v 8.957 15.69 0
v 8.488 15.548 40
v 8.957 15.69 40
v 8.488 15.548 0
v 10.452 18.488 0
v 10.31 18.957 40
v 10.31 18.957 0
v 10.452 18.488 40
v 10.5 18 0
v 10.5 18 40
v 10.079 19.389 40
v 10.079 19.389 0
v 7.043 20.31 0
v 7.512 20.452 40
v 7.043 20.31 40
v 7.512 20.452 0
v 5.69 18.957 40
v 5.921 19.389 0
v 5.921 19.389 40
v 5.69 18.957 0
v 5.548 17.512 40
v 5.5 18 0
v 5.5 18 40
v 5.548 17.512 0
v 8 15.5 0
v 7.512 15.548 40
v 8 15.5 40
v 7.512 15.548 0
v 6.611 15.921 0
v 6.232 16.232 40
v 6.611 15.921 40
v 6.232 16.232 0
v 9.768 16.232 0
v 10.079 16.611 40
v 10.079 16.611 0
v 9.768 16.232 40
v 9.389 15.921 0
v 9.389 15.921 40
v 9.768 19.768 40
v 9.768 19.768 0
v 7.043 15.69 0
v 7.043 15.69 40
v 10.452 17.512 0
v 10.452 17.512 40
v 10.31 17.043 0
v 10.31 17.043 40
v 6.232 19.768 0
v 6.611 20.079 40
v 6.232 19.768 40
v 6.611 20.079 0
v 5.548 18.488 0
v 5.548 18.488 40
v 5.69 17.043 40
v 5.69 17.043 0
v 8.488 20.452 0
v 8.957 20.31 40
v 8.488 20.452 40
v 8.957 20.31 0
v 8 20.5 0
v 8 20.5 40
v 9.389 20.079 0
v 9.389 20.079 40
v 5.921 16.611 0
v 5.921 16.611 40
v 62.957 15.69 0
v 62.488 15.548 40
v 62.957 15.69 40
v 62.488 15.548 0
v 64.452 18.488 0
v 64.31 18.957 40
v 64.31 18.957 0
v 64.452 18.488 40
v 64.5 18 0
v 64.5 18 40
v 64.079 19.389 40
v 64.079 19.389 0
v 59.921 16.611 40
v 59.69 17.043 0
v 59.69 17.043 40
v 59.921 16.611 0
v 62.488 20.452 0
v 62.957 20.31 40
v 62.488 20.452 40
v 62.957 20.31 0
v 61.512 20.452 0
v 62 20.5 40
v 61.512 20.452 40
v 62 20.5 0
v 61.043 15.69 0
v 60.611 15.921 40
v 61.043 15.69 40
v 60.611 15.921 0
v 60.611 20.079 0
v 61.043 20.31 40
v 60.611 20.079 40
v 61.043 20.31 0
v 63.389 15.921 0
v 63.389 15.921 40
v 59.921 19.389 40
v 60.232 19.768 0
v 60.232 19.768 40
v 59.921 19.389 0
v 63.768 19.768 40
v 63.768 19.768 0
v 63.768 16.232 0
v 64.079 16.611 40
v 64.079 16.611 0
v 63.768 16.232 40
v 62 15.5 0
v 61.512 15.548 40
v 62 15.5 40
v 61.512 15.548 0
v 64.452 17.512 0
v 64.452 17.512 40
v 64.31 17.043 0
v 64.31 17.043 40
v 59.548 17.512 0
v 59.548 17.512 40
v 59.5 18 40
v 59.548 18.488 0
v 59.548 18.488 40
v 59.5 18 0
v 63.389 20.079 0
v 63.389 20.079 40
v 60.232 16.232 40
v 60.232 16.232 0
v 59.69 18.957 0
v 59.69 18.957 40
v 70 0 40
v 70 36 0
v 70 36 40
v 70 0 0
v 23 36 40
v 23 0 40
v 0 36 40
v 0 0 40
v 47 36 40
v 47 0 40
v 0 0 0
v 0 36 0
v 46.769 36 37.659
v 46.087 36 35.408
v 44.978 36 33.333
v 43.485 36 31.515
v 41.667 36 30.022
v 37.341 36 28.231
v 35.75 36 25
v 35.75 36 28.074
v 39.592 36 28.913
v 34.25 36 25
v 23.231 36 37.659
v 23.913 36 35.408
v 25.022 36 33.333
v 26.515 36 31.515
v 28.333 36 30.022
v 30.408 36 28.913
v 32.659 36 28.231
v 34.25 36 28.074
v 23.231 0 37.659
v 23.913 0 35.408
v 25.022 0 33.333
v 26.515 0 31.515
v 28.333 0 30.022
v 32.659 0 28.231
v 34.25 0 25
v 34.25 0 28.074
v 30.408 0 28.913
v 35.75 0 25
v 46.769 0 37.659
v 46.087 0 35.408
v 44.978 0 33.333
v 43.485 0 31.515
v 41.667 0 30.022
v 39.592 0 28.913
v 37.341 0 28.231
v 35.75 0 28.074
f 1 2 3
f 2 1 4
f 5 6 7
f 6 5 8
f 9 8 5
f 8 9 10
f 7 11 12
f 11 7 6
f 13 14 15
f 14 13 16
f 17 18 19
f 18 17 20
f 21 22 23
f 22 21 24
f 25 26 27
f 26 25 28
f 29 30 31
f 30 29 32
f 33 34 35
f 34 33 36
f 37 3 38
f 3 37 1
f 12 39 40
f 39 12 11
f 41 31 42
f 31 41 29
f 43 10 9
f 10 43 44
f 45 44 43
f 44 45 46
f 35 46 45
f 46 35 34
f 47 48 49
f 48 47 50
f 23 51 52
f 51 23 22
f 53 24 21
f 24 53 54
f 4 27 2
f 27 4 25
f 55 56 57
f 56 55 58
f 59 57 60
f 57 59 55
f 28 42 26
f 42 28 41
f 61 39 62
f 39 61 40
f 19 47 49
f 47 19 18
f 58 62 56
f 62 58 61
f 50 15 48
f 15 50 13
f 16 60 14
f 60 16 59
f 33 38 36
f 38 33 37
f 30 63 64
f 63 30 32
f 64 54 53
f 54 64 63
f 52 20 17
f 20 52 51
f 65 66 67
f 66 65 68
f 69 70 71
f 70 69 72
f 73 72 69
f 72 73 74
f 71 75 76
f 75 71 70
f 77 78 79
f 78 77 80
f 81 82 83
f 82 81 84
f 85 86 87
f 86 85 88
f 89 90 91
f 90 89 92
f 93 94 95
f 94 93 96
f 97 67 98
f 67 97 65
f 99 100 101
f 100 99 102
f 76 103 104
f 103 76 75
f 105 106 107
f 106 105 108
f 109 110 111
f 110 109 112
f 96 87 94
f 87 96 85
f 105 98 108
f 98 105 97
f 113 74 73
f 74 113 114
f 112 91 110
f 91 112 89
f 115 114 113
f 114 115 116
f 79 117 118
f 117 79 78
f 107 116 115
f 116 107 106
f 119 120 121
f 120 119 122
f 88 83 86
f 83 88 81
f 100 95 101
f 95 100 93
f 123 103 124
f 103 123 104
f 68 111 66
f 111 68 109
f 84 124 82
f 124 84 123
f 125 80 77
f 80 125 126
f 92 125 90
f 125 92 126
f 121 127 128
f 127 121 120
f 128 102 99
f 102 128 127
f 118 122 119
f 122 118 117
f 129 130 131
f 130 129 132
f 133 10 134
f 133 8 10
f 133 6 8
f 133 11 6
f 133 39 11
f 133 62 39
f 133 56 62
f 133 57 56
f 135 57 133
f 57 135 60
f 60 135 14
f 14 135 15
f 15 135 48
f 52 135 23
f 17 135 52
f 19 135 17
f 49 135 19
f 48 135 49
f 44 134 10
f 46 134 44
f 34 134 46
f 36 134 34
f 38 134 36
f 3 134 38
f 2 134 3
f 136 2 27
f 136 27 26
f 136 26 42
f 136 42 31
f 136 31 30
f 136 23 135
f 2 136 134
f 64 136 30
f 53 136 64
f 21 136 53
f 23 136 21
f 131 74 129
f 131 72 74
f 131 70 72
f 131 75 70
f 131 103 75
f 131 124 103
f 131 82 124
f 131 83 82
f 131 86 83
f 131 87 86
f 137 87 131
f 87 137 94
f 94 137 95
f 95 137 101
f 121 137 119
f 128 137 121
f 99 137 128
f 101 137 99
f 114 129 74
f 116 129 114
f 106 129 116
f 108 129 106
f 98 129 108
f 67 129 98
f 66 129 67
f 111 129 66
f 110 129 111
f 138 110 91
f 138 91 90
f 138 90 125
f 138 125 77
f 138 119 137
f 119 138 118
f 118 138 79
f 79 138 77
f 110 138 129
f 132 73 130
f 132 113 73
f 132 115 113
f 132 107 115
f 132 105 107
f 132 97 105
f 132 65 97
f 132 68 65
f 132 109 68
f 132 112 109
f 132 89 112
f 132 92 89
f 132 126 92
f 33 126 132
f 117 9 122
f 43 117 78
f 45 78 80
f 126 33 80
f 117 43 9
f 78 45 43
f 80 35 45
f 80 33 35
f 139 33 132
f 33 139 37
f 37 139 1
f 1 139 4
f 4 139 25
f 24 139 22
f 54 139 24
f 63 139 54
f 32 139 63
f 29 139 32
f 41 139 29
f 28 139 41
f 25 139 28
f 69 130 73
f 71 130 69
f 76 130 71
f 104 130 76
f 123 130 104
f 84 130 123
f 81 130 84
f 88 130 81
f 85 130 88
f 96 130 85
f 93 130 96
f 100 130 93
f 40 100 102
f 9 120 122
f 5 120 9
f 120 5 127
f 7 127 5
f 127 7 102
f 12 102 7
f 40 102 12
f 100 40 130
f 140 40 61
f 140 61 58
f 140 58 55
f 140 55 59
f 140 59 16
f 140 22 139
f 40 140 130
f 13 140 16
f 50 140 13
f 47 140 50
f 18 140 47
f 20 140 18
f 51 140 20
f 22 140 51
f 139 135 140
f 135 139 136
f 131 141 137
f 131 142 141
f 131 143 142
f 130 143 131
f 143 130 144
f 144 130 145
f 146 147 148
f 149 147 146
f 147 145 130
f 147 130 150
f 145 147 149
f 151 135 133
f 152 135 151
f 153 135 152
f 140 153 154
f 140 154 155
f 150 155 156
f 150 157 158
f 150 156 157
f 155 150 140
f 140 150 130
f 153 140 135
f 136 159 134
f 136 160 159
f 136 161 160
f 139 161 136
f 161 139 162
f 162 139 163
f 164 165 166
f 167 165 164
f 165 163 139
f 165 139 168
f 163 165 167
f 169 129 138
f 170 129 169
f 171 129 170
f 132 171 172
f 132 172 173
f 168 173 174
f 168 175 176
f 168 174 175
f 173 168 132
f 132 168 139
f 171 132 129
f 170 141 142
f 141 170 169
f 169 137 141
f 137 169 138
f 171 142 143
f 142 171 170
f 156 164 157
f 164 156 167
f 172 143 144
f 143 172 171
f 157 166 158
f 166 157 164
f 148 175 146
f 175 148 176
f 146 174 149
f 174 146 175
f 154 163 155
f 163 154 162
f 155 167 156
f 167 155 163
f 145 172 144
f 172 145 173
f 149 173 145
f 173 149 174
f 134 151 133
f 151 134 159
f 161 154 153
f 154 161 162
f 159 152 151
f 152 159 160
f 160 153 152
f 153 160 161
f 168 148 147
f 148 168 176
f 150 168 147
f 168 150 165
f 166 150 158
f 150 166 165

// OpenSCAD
$fn = 32;

// ----------------------------------------------------------------------
// Saddle clamp: split shaft clamp
// ----------------------------------------------------------------------

// --- parameters (mm) ---
blk_l = 70;               // block length, X
blk_w = 36;               // block width, Y
blk_h = 40;               // block height
clamp_r = 12;             // shaft groove radius
hole_r = 2.5;             // bolt hole radius
hole_m = 8;               // bolt hole margin from the ends
saw_w = 1.5;              // saw kerf width

saw_depth = clamp_r + 3;  // saw kerf depth

difference() {
  cube([blk_l, blk_w, blk_h]);
  translate([blk_l / 2, -1, blk_h])
    rotate([-90, 0, 0])
      cylinder(h = blk_w + 2, r = clamp_r);
  for (sx = [0, 1])
    translate([sx ? blk_l - hole_m : hole_m, blk_w / 2, -1])
      cylinder(r = hole_r, h = blk_h + 2);
  translate([blk_l / 2 - saw_w / 2, -1, blk_h - saw_depth])
    cube([saw_w, blk_w + 2, saw_depth + 1]);
}
